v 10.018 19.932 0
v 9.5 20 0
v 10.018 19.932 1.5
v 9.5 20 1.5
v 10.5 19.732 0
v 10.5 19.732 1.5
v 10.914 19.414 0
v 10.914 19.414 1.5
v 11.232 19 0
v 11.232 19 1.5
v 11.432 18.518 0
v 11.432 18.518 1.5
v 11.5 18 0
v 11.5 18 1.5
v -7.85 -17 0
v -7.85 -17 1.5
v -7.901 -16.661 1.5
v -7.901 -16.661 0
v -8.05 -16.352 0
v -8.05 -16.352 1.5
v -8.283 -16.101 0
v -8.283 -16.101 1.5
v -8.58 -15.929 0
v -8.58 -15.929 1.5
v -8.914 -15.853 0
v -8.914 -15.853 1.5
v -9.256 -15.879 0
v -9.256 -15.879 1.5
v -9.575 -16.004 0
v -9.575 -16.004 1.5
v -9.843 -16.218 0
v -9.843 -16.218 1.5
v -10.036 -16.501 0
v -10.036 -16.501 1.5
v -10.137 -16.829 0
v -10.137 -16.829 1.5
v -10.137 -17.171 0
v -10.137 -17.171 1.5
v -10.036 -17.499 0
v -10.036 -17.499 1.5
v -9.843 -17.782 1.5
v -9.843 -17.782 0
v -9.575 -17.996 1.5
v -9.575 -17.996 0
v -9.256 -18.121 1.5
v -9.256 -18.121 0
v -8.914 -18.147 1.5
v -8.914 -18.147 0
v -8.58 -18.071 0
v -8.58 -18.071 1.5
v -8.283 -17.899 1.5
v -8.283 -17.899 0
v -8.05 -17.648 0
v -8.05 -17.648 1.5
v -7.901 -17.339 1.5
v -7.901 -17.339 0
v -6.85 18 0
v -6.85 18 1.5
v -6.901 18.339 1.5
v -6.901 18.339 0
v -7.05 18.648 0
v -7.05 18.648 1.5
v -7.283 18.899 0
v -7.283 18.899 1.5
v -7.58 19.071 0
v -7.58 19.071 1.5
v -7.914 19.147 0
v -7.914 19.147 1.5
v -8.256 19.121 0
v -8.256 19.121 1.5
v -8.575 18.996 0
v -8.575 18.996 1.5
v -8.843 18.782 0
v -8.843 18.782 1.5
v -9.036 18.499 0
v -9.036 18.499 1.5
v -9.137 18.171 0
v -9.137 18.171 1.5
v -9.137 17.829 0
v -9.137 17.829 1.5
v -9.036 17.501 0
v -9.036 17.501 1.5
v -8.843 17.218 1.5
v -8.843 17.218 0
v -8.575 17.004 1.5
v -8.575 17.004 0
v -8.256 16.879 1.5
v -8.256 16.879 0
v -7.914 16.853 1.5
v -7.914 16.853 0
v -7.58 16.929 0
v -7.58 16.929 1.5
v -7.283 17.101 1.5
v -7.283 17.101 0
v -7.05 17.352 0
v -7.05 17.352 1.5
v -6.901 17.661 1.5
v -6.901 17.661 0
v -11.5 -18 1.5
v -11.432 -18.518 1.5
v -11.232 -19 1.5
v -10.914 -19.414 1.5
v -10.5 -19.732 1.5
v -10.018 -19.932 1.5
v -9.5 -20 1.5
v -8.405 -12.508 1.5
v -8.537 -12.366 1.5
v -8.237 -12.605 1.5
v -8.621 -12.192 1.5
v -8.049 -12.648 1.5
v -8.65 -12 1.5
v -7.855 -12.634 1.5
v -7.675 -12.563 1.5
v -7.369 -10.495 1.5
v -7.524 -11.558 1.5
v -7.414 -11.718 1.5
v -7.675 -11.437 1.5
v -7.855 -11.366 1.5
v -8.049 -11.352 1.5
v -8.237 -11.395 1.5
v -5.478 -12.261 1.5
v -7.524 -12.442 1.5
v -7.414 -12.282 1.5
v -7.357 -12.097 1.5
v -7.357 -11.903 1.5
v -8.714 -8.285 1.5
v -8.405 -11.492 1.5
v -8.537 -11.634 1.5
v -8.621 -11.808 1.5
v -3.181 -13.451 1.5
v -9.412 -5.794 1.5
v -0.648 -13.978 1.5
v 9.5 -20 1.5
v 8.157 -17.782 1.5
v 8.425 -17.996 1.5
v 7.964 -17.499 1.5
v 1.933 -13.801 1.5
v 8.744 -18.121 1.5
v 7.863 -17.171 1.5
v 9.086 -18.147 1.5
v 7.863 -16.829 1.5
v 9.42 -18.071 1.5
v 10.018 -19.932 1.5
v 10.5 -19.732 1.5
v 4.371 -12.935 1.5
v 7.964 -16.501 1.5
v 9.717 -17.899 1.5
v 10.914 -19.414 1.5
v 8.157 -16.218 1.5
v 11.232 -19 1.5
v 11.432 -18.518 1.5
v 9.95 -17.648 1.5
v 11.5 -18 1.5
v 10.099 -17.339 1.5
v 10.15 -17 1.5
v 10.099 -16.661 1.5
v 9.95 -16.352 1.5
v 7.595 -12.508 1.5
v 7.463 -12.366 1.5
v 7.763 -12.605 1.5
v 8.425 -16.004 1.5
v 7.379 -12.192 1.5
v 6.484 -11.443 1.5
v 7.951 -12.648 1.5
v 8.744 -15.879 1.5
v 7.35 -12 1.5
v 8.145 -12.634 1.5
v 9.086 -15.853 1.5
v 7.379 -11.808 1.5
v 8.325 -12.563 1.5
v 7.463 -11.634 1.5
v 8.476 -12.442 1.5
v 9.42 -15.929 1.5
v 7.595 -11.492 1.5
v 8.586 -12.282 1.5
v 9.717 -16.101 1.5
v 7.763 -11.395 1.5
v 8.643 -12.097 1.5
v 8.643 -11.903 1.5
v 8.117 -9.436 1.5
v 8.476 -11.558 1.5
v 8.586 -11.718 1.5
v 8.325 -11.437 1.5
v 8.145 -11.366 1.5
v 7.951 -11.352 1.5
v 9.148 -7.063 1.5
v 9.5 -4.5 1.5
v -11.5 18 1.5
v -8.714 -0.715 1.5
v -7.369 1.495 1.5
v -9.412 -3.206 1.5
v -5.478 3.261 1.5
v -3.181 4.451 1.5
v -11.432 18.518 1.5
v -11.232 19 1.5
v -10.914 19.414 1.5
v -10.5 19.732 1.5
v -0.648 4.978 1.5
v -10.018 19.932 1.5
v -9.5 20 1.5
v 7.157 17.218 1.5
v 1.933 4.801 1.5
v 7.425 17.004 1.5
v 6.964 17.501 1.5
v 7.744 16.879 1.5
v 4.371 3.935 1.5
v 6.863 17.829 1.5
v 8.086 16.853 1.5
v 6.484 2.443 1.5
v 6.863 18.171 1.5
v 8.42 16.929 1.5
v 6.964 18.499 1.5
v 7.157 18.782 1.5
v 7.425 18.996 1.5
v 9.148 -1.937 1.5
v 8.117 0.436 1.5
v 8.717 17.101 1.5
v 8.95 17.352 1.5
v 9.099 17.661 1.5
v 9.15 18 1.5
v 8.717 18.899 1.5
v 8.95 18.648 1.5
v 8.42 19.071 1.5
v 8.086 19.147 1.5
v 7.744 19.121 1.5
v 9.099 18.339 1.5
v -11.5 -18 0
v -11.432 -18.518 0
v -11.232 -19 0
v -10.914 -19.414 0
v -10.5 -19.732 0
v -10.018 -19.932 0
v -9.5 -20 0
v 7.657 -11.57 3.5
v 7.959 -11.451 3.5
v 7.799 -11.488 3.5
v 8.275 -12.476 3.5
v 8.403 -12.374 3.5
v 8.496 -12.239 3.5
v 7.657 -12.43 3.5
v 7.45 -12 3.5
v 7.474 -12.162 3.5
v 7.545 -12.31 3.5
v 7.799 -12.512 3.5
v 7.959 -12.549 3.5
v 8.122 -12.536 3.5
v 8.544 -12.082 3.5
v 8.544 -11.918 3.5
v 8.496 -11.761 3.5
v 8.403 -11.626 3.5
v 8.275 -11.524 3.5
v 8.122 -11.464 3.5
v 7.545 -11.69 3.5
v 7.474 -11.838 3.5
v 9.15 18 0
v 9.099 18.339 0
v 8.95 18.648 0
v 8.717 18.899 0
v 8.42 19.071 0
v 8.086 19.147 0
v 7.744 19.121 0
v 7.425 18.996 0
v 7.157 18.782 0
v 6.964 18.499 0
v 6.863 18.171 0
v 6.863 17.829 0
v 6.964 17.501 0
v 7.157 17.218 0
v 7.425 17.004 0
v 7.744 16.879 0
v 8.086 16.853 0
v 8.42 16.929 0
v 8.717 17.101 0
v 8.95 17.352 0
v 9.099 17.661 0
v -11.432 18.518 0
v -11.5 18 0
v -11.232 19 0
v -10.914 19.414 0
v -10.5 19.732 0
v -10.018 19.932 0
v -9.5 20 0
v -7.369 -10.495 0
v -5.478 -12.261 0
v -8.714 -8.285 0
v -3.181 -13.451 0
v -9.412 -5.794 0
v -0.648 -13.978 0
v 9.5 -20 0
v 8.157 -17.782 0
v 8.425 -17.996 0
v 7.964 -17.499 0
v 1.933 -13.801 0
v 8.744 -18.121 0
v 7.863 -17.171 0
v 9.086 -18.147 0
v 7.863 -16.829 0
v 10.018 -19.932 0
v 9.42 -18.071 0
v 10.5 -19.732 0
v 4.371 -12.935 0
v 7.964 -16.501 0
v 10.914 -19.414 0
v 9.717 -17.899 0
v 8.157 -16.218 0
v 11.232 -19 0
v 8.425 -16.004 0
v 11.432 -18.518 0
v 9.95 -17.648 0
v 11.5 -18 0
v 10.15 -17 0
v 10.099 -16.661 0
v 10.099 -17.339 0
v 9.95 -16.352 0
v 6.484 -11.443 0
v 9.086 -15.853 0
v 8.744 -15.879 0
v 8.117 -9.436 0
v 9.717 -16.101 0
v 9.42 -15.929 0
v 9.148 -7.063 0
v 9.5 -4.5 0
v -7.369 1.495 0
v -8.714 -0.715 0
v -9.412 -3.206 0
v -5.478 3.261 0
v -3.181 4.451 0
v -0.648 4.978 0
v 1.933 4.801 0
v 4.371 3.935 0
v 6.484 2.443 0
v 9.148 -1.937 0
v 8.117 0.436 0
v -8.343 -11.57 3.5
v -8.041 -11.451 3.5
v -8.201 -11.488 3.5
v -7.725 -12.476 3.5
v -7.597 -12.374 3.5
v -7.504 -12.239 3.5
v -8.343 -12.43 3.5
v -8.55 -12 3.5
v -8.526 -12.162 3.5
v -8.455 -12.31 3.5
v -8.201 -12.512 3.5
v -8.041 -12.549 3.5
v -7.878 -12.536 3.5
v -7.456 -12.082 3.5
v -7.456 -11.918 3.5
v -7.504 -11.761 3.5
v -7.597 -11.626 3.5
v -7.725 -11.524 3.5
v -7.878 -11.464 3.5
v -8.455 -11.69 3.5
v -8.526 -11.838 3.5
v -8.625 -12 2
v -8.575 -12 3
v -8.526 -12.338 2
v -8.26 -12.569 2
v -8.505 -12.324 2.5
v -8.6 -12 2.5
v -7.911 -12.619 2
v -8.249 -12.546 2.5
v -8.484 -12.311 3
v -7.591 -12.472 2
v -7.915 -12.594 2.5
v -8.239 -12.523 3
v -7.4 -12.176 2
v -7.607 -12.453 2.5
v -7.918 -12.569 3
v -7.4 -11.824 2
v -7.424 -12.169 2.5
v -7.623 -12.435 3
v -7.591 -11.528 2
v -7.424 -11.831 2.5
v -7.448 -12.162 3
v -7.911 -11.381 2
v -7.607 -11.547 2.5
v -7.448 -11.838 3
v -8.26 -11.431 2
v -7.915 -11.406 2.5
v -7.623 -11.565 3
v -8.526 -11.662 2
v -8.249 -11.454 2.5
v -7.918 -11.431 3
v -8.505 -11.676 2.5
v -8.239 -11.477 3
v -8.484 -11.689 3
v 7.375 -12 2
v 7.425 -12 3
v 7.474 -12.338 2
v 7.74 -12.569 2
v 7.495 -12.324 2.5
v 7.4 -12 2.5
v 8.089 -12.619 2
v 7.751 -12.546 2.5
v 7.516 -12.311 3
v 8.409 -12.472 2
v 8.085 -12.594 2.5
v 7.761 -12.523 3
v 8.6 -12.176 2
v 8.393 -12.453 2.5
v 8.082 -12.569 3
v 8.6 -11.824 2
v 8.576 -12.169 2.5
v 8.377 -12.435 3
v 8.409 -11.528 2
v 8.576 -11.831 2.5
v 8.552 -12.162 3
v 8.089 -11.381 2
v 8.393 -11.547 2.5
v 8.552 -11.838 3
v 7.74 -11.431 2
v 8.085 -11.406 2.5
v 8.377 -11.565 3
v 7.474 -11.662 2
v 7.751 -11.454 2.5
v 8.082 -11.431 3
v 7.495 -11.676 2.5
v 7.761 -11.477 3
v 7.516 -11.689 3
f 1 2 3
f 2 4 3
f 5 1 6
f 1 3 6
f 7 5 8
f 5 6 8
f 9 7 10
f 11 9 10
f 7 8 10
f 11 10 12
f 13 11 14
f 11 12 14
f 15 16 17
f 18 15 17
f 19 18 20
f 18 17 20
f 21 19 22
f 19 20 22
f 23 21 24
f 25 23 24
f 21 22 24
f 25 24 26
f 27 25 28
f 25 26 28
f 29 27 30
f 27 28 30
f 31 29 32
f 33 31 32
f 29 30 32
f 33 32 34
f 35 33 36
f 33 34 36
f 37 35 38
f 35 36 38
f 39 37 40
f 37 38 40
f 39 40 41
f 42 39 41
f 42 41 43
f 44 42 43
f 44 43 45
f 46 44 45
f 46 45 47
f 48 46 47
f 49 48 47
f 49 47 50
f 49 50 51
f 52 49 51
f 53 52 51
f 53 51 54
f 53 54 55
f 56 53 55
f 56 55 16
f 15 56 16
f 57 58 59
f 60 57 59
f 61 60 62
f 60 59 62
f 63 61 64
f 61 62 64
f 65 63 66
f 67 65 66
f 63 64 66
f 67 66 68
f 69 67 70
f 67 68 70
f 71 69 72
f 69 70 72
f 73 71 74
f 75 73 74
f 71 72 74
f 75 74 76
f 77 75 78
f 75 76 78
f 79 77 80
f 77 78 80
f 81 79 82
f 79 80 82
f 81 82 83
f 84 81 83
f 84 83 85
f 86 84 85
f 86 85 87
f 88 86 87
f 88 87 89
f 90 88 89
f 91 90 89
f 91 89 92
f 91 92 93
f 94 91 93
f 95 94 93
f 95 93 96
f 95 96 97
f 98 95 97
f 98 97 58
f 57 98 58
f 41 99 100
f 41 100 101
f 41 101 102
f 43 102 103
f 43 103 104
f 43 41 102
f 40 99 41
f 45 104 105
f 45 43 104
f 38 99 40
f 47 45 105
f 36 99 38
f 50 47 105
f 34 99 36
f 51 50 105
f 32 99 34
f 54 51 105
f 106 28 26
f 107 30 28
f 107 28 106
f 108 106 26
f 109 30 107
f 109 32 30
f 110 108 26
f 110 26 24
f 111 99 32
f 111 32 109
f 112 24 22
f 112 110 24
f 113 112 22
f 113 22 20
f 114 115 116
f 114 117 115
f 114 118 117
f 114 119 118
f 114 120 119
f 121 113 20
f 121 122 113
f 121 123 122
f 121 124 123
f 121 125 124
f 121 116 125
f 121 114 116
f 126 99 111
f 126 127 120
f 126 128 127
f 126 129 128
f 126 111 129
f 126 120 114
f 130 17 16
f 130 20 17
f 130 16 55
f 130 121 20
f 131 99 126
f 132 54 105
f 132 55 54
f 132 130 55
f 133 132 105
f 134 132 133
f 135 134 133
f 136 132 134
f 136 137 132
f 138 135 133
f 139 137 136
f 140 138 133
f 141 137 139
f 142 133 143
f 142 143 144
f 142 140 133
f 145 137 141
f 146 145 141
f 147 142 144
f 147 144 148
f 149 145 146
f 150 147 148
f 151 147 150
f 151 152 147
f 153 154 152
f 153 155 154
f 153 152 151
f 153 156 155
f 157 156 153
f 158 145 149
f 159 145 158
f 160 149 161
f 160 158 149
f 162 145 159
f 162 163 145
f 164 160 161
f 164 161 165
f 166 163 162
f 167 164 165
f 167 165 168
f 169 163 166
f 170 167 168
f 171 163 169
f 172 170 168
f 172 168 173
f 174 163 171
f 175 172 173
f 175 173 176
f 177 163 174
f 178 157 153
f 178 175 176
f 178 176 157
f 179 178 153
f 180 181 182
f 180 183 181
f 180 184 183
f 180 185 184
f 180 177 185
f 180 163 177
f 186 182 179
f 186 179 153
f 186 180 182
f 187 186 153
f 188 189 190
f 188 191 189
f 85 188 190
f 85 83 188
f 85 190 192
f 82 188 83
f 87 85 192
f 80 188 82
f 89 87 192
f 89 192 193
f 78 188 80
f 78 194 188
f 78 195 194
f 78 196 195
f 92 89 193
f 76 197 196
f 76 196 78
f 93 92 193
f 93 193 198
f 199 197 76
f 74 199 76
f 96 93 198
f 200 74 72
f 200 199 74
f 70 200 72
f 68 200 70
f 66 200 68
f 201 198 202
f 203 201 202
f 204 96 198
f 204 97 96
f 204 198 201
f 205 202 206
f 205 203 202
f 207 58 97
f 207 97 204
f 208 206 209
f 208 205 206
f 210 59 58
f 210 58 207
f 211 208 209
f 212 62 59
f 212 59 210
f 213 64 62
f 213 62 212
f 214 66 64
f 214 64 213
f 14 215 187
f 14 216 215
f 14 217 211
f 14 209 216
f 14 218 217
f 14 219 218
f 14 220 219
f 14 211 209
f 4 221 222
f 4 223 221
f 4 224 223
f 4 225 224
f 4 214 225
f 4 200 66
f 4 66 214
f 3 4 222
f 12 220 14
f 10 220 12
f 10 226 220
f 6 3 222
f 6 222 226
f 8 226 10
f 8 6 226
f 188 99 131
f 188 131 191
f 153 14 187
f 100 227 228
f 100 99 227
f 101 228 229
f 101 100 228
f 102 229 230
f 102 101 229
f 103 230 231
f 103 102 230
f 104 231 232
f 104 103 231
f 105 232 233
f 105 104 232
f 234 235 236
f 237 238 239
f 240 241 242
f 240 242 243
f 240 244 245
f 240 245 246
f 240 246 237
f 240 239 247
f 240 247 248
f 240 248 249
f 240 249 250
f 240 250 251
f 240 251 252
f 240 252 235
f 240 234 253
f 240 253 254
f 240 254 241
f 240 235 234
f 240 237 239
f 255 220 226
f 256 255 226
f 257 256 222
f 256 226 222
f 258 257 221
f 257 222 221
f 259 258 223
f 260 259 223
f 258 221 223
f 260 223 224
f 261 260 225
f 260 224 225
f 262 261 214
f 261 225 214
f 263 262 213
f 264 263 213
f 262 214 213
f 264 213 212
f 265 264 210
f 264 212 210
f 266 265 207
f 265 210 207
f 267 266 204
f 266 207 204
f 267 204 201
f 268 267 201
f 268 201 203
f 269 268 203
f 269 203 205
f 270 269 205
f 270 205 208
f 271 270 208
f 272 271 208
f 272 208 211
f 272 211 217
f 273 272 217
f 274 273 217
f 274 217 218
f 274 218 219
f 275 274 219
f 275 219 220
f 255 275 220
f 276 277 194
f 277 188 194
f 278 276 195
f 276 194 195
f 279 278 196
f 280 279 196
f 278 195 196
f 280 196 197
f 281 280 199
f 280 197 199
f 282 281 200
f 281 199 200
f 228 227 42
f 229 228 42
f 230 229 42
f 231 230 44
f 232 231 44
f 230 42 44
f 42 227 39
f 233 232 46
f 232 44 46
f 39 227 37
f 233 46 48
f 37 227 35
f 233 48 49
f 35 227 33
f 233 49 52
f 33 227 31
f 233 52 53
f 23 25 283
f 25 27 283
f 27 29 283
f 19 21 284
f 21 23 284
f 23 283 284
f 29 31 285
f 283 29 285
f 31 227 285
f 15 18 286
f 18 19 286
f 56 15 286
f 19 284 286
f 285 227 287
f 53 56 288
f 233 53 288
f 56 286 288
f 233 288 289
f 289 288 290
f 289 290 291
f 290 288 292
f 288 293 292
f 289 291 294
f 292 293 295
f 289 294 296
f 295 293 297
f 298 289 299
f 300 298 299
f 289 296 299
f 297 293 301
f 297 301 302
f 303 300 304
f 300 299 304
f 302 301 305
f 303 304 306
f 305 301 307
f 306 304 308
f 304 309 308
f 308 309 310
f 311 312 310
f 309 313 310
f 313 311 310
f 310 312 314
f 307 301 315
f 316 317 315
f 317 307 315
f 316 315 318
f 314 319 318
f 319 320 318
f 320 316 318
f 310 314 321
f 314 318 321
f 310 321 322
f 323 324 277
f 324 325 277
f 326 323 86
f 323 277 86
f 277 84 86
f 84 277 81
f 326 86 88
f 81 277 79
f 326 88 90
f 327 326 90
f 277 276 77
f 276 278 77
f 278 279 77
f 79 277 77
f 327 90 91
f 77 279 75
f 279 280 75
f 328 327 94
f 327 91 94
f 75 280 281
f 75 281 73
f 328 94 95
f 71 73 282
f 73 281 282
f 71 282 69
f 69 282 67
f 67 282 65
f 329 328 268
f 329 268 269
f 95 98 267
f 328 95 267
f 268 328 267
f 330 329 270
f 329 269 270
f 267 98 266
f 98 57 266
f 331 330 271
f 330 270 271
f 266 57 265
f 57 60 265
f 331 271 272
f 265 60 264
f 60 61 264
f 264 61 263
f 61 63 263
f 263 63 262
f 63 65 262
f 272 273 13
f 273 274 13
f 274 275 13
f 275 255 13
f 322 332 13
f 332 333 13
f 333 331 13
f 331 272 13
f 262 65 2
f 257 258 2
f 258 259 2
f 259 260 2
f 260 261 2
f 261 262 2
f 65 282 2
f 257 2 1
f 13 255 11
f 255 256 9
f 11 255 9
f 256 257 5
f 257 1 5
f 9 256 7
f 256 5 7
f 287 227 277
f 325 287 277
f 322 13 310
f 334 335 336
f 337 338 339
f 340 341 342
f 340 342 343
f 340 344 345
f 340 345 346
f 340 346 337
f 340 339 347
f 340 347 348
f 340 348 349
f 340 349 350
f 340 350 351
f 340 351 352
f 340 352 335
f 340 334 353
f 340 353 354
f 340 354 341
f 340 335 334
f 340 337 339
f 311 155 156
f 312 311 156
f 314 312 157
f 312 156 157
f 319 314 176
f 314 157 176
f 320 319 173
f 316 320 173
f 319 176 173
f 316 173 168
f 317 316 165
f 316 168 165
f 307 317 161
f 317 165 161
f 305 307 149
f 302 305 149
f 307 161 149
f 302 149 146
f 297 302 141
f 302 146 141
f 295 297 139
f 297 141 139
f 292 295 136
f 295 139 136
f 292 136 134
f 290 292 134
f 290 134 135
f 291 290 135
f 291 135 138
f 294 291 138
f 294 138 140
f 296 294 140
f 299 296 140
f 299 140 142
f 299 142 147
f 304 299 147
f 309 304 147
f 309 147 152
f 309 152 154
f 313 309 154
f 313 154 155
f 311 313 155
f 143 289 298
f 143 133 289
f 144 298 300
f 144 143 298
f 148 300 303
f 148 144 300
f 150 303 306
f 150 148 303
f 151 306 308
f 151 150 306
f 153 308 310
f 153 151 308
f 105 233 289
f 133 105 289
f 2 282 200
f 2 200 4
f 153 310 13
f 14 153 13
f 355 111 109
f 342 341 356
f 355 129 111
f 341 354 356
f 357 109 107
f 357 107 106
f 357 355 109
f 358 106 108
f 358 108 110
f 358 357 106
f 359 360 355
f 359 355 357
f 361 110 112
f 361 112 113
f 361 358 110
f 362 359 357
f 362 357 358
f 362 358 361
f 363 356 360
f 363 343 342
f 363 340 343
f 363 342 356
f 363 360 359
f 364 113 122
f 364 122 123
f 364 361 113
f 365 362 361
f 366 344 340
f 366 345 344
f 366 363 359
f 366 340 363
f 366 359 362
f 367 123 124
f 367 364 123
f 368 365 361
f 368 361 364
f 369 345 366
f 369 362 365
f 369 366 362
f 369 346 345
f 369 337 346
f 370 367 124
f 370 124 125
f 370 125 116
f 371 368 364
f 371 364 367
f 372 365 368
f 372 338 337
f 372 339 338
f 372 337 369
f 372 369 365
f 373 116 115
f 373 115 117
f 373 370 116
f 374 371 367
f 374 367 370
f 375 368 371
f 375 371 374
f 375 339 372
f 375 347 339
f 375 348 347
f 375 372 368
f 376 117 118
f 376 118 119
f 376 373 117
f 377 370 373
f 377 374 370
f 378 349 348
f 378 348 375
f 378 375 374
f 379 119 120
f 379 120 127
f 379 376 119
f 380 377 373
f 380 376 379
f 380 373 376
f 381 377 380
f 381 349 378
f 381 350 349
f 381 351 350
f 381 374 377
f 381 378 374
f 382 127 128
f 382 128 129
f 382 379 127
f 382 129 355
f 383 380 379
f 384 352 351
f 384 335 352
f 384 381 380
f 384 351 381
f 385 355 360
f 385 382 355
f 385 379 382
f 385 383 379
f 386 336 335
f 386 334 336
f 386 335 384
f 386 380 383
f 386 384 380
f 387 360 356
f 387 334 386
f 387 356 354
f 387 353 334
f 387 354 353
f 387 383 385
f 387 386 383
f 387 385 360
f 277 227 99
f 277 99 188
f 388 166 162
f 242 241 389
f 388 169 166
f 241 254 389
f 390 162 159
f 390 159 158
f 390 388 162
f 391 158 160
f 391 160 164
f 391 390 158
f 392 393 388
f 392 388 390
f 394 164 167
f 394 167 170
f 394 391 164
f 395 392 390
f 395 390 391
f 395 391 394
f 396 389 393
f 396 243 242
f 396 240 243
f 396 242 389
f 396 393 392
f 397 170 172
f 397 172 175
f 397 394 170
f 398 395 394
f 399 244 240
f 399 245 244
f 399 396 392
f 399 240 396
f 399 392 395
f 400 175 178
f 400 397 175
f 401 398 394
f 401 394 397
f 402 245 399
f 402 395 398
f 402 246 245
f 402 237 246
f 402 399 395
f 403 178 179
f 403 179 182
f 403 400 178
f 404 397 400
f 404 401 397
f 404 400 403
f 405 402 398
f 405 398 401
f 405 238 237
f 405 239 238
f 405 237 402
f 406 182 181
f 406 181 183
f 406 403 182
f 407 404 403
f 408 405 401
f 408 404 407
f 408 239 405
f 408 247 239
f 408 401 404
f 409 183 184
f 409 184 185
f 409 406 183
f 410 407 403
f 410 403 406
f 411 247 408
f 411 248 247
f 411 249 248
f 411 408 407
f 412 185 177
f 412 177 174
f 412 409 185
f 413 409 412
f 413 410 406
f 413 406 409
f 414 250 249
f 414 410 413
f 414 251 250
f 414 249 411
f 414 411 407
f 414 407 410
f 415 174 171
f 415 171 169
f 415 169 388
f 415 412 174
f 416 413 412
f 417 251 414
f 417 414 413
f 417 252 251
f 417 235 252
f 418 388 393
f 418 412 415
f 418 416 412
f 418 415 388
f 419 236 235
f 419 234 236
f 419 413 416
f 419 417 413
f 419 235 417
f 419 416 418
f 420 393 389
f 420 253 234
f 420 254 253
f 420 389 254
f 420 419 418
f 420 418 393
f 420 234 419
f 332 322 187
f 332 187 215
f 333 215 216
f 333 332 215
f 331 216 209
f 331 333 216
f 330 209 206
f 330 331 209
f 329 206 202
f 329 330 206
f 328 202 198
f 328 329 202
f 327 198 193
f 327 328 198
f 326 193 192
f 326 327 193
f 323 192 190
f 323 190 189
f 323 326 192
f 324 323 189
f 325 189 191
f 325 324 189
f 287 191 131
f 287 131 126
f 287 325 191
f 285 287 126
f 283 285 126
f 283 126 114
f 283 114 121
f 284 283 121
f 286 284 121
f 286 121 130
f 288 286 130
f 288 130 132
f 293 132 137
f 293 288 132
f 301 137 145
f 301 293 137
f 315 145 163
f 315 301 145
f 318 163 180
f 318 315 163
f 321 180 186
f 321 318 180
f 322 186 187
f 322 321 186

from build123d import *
from OCP.BRepFilletAPI import BRepFilletAPI_MakeChamfer

# Parameters (mm, degrees)
SKETCH_1_W          = 23
SKETCH_1_H          = 40
SKETCH_1_R          = 9.5
EXTRUDE_1_DEPTH     = 1.5
FILLET_1_R          = 2
SKETCH_3_R          = 1.15
CUT_EXTRUDE_1_DEPTH = 24.119256043
SKETCH_4_R          = 0.65
EXTRUDE_2_DEPTH     = 2
CHAMFER_1_SIZE      = 2
CHAMFER_1_SIZE_2    = 0.1


with BuildPart() as part:
    # 草图1 → 凸台-拉伸1 (new body)
    with BuildSketch(Plane.XY):
        Rectangle(SKETCH_1_W, SKETCH_1_H)
        with Locations((0, -4.5)):
            Circle(SKETCH_1_R, mode=Mode.SUBTRACT)
    extrude(amount=EXTRUDE_1_DEPTH)

    # 圆角1
    fillet_1_edges = [part.edges().sort_by_distance(p)[0] for p in [
        (11.5, -20, 0.75),
        (-11.5, -20, 0.75),
        (-11.5, 20, 0.75),
        (11.5, 20, 0.75),
    ]]
    fillet(fillet_1_edges, radius=FILLET_1_R)

    # 草图3 → 切除-拉伸1 (cut, through all)
    with BuildSketch(Plane.XY.offset(1.5)):
        with Locations((-8, 18)):
            Circle(SKETCH_3_R)
        with Locations((8, 18)):
            Circle(SKETCH_3_R)
        with Locations((-9, -17)):
            Circle(SKETCH_3_R)
        with Locations((9, -17)):
            Circle(SKETCH_3_R)
    extrude(amount=-CUT_EXTRUDE_1_DEPTH, mode=Mode.SUBTRACT)

    # 草图4 → 凸台-拉伸2 (add)
    with BuildSketch(Plane.XY.offset(1.5)):
        with Locations(Location((-8, -12, 0), (0, 0, 180))):
            Circle(SKETCH_4_R)
        with Locations(Location((8, -12, 0), (0, 0, 180))):
            Circle(SKETCH_4_R)
    extrude(amount=EXTRUDE_2_DEPTH)

    # 倒角1
    chamfer_1_edges_1 = [part.edges().sort_by_distance(p)[0] for p in [
        (-7.35, -12, 3.5),
    ]]
    chamfer_1_side_1 = [part.faces().sort_by_distance(p)[0] for p in [
        (-7.35, -12, 3.498),
    ]]
    chamfer_1_edges_2 = [part.edges().sort_by_distance(p)[0] for p in [
        (8.65, -12, 3.5),
    ]]
    chamfer_1_side_2 = [part.faces().sort_by_distance(p)[0] for p in [
        (8.65, -12, 3.498),
    ]]
    chamfer_1 = BRepFilletAPI_MakeChamfer(part.part.solid().wrapped)
    for e in chamfer_1_edges_1:
        chamfer_1.Add(CHAMFER_1_SIZE - 0.0001, CHAMFER_1_SIZE_2 - 0.0001, e.wrapped, chamfer_1_side_1[0].wrapped)
    for e in chamfer_1_edges_2:
        chamfer_1.Add(CHAMFER_1_SIZE - 0.0001, CHAMFER_1_SIZE_2 - 0.0001, e.wrapped, chamfer_1_side_2[0].wrapped)
    add(Compound.cast(chamfer_1.Shape()), mode=Mode.REPLACE)  # a hair under: the kernel refuses the full size


solid = part.part
